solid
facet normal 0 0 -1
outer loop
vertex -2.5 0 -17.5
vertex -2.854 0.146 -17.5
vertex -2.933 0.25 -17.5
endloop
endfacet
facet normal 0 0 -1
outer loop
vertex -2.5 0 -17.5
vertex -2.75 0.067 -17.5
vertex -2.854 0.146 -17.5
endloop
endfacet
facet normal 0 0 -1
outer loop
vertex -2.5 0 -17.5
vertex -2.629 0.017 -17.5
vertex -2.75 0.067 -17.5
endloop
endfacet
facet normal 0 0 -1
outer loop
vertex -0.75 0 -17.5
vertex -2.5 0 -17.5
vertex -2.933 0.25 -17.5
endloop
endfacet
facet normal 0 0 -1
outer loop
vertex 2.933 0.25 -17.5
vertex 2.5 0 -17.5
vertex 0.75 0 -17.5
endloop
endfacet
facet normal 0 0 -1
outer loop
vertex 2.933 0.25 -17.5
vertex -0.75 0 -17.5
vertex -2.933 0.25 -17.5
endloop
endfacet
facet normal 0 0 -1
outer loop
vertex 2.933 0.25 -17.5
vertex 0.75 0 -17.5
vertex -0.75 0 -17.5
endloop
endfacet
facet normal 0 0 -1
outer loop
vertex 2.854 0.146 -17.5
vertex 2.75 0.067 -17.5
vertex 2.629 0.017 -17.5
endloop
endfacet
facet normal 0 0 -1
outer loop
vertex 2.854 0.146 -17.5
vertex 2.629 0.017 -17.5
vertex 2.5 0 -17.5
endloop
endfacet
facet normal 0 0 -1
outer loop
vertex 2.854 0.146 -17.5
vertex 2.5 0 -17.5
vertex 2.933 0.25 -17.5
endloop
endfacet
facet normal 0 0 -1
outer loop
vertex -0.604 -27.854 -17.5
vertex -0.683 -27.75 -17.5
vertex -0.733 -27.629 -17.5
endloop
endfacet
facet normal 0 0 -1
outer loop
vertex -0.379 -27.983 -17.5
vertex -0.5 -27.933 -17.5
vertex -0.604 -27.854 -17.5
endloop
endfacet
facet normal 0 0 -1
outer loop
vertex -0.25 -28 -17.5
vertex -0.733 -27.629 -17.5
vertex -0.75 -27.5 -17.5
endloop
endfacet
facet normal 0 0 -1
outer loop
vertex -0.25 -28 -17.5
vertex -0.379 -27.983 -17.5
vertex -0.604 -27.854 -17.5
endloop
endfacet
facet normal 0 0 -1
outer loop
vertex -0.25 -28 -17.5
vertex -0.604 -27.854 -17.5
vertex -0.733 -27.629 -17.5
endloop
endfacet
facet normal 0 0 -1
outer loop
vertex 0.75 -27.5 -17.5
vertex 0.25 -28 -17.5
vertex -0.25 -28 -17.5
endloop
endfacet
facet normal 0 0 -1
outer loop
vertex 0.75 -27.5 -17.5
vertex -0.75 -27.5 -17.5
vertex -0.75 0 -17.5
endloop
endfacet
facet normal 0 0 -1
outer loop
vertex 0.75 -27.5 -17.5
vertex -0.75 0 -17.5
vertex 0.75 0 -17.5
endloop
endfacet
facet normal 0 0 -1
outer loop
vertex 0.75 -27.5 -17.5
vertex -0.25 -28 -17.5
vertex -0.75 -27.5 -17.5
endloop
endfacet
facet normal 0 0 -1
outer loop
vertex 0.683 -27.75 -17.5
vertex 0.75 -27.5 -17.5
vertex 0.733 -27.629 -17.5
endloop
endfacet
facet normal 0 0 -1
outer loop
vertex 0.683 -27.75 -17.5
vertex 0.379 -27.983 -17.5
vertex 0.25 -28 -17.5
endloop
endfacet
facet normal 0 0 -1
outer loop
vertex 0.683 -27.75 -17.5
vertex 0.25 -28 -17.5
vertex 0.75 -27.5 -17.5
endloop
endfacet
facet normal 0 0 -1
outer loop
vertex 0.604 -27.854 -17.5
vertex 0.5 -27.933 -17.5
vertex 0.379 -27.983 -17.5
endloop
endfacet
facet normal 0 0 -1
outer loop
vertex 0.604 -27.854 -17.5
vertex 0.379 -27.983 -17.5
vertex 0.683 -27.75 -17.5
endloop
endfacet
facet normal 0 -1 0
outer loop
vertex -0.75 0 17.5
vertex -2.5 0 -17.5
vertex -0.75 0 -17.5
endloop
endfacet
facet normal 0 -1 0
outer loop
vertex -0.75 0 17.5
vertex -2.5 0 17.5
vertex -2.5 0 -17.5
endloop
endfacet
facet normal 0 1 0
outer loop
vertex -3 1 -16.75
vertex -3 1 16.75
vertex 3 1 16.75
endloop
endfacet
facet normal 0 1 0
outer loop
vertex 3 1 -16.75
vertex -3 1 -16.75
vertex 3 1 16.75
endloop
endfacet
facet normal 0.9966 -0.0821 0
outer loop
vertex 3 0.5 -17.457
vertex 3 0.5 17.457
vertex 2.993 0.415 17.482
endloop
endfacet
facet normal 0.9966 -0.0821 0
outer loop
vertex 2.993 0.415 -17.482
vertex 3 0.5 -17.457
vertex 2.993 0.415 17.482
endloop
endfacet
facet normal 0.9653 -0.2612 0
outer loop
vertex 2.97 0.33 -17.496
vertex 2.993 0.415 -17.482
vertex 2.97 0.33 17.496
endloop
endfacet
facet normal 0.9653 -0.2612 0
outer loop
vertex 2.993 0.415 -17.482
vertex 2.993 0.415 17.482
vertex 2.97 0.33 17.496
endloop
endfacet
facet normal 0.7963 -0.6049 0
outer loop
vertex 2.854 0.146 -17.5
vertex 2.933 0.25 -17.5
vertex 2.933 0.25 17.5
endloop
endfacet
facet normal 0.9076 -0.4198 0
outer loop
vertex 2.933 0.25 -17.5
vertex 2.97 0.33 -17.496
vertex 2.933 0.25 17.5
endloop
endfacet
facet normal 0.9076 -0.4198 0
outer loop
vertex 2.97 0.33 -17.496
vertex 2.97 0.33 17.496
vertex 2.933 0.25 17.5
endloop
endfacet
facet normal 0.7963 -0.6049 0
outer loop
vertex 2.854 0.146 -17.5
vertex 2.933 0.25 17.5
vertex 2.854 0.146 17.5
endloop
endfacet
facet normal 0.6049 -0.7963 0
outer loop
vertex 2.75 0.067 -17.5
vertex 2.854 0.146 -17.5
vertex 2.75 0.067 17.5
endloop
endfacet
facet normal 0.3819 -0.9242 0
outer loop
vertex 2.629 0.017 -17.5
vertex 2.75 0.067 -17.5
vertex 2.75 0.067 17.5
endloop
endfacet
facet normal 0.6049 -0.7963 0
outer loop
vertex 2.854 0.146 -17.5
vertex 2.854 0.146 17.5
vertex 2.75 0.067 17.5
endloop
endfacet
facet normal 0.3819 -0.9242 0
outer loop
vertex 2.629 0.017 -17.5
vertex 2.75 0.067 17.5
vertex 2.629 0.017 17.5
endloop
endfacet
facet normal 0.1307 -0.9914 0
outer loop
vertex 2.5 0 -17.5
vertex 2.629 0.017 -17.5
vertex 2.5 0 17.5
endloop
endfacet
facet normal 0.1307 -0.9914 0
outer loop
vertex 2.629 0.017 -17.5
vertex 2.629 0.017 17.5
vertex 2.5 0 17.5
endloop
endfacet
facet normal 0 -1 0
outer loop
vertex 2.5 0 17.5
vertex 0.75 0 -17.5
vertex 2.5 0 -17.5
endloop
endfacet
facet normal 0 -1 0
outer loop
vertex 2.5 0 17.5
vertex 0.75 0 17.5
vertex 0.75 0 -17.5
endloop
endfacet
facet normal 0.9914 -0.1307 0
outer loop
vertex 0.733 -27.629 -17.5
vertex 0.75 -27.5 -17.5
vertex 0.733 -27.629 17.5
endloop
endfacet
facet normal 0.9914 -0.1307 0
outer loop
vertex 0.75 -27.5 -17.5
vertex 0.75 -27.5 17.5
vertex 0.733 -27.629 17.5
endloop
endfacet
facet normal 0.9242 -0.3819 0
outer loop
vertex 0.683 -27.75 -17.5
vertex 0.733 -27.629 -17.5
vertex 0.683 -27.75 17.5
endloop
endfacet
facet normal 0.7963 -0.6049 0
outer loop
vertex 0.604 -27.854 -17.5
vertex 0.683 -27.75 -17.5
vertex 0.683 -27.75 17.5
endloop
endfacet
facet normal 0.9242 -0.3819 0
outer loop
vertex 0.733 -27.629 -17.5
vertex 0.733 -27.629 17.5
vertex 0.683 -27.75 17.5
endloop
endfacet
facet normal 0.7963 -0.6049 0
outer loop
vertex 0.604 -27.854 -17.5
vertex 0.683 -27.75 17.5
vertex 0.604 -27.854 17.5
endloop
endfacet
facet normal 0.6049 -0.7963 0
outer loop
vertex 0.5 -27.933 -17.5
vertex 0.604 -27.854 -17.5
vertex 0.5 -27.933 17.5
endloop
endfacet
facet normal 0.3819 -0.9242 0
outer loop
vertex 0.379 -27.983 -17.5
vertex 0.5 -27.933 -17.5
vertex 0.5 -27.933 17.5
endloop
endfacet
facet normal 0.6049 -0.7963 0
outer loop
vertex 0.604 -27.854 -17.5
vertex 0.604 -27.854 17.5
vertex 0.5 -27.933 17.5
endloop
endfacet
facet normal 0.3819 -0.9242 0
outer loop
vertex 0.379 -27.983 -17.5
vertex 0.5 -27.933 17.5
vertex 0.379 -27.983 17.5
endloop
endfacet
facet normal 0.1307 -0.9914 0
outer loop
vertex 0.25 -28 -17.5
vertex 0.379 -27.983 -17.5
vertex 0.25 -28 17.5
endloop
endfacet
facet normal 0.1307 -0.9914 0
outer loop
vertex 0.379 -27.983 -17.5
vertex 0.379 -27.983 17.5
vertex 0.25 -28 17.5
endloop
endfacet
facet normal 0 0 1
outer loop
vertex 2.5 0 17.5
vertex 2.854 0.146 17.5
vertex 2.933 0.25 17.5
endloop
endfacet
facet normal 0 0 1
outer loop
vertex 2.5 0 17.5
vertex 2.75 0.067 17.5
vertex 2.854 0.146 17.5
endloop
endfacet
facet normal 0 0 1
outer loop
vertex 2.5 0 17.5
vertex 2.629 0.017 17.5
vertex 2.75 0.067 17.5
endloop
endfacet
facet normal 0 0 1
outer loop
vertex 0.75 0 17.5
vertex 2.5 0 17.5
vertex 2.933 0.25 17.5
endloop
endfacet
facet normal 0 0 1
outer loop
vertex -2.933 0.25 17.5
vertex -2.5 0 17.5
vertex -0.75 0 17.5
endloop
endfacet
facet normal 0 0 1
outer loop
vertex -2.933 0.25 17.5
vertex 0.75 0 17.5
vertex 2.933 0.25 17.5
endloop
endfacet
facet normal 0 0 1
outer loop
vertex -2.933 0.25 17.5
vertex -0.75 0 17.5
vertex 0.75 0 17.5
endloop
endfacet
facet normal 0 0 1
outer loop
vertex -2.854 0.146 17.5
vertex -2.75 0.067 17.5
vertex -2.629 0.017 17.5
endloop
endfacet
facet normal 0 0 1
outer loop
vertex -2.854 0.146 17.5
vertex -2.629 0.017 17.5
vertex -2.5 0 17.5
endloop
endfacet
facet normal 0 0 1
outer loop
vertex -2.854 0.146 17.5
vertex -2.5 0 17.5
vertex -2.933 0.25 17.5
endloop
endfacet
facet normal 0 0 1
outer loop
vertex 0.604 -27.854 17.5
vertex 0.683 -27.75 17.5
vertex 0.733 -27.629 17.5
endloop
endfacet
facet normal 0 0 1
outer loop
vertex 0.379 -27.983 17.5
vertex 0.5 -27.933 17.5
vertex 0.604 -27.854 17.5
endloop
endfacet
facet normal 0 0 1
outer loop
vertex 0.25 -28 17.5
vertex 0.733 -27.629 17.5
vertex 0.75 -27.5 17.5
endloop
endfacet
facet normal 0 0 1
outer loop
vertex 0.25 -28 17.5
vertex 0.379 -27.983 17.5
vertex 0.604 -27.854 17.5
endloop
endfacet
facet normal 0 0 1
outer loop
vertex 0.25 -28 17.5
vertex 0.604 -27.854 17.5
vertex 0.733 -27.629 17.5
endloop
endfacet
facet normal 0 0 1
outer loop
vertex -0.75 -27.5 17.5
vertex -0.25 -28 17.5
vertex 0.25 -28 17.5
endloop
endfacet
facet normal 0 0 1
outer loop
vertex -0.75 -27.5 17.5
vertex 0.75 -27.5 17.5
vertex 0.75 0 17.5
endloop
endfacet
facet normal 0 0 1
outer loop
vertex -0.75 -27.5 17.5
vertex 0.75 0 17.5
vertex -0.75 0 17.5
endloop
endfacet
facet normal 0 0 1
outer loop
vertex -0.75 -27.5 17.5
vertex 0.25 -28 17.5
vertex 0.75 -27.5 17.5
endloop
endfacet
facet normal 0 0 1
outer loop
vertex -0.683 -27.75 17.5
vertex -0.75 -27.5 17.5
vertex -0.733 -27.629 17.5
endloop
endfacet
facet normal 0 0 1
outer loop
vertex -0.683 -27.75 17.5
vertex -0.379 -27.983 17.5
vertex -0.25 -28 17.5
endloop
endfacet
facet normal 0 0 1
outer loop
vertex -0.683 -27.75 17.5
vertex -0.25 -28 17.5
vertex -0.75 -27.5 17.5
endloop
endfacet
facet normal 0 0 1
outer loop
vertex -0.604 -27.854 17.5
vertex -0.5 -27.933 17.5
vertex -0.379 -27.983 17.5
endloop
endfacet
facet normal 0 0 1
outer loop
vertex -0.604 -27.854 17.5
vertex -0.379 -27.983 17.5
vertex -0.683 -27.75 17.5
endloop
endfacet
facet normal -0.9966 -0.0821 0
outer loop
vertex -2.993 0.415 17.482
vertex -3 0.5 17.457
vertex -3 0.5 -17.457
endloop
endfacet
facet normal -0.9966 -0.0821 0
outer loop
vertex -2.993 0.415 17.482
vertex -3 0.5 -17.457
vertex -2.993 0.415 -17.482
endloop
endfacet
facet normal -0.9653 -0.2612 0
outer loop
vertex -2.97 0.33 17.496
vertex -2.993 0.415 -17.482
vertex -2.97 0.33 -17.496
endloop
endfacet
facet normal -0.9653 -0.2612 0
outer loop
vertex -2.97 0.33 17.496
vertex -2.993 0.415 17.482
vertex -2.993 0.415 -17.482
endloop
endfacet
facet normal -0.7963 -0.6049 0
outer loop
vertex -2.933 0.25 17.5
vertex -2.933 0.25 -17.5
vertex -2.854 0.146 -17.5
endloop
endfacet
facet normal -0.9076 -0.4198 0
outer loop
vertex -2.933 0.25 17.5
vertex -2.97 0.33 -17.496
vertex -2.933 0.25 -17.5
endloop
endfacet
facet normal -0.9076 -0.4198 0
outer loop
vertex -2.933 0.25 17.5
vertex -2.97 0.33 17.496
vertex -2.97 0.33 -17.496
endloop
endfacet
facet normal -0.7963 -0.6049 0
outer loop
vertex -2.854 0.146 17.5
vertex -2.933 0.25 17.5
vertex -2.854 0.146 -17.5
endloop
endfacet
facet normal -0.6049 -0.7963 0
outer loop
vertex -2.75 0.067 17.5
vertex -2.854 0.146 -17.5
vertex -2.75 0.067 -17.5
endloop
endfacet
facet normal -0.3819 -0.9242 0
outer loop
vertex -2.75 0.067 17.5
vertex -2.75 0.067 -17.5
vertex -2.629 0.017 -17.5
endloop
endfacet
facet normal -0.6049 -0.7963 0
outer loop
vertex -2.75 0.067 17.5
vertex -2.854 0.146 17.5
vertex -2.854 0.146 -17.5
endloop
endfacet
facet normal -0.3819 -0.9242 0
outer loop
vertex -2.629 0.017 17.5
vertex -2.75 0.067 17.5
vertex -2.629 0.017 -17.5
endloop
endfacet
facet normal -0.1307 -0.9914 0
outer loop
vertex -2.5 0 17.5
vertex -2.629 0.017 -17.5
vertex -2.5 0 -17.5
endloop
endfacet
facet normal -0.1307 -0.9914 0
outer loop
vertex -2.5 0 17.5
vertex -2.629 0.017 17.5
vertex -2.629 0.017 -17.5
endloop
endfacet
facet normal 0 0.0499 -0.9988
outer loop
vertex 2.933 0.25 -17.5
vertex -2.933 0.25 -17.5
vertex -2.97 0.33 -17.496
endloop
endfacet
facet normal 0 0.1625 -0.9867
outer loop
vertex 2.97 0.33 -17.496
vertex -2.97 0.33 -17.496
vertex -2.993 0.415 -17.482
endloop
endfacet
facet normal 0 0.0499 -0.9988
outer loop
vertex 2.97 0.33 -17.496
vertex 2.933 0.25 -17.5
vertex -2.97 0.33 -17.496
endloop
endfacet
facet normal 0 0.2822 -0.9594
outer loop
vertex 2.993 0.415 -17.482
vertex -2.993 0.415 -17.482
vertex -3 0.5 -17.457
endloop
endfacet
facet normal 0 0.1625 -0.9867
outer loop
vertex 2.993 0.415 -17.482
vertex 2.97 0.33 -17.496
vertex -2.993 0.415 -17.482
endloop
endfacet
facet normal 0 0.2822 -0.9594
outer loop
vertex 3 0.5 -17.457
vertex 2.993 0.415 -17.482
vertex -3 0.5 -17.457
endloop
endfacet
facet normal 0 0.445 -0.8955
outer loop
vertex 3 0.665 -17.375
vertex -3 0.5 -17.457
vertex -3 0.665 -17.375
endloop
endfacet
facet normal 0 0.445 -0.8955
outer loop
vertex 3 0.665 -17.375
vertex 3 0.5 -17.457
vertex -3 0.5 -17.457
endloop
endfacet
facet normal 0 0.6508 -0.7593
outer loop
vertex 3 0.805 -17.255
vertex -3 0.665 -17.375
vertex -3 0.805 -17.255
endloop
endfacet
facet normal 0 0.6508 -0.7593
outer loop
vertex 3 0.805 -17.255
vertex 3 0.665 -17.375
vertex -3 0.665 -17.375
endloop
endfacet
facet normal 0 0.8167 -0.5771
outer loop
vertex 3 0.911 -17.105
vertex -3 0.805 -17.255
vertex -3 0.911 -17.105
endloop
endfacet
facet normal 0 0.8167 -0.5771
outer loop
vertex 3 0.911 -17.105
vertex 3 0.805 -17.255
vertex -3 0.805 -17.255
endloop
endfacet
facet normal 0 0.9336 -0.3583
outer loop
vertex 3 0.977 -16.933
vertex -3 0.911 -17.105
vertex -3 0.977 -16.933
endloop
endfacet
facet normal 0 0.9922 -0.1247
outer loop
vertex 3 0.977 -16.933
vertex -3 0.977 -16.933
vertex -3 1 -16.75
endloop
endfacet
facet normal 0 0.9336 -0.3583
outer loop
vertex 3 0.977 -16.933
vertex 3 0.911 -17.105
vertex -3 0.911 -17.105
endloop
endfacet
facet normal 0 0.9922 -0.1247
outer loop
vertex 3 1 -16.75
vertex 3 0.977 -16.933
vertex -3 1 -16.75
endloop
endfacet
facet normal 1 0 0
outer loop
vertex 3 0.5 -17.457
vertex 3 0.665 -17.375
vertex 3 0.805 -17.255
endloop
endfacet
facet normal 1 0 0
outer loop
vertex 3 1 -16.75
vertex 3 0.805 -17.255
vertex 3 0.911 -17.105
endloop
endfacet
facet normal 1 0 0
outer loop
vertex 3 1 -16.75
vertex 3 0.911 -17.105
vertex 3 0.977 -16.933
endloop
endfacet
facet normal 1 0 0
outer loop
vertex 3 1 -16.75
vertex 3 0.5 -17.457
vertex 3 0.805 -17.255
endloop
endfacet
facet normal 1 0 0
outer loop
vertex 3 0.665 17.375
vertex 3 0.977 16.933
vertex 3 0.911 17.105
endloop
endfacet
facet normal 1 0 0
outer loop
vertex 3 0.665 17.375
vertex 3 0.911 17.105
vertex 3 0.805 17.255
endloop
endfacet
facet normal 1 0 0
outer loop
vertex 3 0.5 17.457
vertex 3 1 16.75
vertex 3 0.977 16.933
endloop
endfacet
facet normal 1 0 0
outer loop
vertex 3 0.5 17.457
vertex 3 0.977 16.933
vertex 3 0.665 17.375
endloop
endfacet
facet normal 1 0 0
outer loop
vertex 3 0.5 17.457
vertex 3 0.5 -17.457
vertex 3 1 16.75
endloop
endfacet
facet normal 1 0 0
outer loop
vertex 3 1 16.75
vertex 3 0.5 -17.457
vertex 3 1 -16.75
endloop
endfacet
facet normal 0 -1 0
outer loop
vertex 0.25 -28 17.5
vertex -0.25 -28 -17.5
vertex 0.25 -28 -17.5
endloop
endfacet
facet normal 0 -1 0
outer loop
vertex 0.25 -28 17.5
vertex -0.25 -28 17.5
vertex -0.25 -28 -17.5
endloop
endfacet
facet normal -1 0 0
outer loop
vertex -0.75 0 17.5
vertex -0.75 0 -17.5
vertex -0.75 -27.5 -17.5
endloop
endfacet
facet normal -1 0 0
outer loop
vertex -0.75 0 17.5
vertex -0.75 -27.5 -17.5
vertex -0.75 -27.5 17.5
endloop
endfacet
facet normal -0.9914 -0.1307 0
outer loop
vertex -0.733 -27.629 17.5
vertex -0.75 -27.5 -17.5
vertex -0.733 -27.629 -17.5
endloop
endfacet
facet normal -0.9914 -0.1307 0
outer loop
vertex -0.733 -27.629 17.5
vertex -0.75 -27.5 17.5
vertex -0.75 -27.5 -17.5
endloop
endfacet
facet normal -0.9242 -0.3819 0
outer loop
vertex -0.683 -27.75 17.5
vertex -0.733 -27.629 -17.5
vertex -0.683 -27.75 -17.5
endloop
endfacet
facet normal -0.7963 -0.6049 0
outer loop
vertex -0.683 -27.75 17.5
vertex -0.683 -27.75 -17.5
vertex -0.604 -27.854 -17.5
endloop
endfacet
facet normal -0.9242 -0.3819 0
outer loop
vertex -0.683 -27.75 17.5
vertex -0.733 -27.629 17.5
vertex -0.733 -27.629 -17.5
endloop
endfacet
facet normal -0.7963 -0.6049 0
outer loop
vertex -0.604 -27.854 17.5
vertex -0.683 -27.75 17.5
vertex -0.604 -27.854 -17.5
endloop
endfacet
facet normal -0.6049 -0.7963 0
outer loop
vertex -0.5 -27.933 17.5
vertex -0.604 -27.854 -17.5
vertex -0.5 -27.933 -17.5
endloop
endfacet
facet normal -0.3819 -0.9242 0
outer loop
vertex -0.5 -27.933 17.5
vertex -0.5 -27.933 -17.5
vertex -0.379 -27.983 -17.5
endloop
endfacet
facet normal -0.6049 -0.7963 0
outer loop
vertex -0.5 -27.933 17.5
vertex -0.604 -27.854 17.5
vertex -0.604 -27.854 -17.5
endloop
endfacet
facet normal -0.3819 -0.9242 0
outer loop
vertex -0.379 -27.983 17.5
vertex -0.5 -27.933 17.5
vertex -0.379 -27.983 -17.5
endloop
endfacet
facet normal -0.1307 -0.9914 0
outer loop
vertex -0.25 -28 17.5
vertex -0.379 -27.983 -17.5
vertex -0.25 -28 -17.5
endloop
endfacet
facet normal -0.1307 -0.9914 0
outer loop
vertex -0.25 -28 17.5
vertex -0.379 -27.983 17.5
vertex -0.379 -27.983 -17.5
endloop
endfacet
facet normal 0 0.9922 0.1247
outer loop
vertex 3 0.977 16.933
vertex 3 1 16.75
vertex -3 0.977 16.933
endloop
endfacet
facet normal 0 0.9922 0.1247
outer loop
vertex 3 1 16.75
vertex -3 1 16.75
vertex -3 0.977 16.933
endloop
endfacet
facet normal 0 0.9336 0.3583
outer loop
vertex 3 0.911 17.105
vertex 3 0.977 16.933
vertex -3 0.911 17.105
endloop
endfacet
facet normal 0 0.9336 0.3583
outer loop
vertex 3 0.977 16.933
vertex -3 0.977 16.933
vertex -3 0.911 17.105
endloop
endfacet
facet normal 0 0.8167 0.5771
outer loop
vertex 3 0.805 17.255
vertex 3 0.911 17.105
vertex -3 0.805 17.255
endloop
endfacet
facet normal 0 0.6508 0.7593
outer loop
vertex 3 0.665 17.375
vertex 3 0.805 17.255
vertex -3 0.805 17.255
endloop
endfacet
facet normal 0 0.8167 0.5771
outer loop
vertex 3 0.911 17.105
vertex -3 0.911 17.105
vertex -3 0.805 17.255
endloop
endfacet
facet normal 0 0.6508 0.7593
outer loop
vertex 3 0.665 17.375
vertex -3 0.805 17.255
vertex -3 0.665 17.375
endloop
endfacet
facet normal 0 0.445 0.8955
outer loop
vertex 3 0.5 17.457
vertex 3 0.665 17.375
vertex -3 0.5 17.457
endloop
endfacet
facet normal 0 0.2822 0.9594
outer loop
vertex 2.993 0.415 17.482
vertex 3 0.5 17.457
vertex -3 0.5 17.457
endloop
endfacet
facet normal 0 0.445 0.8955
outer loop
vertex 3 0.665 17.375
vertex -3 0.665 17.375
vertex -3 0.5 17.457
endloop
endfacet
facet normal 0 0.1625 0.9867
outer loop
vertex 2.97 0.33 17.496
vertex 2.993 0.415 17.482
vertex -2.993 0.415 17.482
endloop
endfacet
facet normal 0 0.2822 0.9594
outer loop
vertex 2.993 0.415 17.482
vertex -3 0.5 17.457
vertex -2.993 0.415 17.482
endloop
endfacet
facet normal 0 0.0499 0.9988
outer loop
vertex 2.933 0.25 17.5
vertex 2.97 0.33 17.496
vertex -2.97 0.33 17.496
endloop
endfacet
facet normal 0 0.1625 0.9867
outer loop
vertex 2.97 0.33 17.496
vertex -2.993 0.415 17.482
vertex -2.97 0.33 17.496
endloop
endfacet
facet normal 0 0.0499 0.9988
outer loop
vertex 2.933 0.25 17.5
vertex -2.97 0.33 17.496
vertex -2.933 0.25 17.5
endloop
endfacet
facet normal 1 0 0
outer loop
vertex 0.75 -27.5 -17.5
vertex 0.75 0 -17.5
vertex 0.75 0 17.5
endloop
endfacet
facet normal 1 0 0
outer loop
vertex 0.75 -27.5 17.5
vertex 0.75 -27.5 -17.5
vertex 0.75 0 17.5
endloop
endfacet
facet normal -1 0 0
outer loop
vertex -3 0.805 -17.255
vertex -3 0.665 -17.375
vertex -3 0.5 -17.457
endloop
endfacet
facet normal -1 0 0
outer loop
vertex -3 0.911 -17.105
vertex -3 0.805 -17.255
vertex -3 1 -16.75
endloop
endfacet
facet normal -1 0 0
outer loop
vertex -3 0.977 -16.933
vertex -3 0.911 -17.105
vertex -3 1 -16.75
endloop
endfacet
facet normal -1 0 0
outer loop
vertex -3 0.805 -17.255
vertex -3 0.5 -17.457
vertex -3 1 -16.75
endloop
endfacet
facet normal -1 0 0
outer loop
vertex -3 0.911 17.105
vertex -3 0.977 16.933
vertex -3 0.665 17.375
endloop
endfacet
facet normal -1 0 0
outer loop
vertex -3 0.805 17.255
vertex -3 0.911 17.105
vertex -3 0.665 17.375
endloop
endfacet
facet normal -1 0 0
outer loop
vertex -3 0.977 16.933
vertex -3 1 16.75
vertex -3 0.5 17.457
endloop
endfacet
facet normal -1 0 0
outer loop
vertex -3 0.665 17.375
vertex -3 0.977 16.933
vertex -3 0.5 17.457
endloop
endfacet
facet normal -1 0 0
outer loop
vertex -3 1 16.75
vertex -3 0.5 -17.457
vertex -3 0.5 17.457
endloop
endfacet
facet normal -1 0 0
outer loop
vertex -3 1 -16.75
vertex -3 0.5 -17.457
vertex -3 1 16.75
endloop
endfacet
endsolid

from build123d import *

# Parameters (mm, degrees)
F0_W     = 2.25
F0_H     = 35
F0_W_2   = 1.5
F1_DEPTH = 1
F2_DEPTH = 28
F3_R     = 0.5
F4_R     = 0.75


with BuildPart() as f1:
    # F0 (on Front) → F1 (new body)
    with BuildSketch(Plane.XZ):
        with Locations((1.875, 0)):
            Rectangle(F0_W, F0_H)
        Rectangle(F0_W_2, F0_H)
        with Locations((-1.875, 0)):
            Rectangle(F0_W, F0_H)
    extrude(amount=-F1_DEPTH)

    # F0 (on Front) → F2 (join)
    with BuildSketch(Plane.XZ):
        Rectangle(F0_W_2, F0_H)
    extrude(amount=F2_DEPTH)

    # F3
    f3_edges = [f1.edges().sort_by_distance(p)[0] for p in [
        (-3, 0, 0),
        (3, 0, 0),
        (-0.75, -28, 0),
        (0.75, -28, 0),
    ]]
    fillet(f3_edges, radius=F3_R)

    # F4
    f4_edges = [f1.edges().sort_by_distance(p)[0] for p in [
        (0, 1, 17.5),
        (0, 1, -17.5),
    ]]
    fillet(f4_edges, radius=F4_R)


solid = f1.part
